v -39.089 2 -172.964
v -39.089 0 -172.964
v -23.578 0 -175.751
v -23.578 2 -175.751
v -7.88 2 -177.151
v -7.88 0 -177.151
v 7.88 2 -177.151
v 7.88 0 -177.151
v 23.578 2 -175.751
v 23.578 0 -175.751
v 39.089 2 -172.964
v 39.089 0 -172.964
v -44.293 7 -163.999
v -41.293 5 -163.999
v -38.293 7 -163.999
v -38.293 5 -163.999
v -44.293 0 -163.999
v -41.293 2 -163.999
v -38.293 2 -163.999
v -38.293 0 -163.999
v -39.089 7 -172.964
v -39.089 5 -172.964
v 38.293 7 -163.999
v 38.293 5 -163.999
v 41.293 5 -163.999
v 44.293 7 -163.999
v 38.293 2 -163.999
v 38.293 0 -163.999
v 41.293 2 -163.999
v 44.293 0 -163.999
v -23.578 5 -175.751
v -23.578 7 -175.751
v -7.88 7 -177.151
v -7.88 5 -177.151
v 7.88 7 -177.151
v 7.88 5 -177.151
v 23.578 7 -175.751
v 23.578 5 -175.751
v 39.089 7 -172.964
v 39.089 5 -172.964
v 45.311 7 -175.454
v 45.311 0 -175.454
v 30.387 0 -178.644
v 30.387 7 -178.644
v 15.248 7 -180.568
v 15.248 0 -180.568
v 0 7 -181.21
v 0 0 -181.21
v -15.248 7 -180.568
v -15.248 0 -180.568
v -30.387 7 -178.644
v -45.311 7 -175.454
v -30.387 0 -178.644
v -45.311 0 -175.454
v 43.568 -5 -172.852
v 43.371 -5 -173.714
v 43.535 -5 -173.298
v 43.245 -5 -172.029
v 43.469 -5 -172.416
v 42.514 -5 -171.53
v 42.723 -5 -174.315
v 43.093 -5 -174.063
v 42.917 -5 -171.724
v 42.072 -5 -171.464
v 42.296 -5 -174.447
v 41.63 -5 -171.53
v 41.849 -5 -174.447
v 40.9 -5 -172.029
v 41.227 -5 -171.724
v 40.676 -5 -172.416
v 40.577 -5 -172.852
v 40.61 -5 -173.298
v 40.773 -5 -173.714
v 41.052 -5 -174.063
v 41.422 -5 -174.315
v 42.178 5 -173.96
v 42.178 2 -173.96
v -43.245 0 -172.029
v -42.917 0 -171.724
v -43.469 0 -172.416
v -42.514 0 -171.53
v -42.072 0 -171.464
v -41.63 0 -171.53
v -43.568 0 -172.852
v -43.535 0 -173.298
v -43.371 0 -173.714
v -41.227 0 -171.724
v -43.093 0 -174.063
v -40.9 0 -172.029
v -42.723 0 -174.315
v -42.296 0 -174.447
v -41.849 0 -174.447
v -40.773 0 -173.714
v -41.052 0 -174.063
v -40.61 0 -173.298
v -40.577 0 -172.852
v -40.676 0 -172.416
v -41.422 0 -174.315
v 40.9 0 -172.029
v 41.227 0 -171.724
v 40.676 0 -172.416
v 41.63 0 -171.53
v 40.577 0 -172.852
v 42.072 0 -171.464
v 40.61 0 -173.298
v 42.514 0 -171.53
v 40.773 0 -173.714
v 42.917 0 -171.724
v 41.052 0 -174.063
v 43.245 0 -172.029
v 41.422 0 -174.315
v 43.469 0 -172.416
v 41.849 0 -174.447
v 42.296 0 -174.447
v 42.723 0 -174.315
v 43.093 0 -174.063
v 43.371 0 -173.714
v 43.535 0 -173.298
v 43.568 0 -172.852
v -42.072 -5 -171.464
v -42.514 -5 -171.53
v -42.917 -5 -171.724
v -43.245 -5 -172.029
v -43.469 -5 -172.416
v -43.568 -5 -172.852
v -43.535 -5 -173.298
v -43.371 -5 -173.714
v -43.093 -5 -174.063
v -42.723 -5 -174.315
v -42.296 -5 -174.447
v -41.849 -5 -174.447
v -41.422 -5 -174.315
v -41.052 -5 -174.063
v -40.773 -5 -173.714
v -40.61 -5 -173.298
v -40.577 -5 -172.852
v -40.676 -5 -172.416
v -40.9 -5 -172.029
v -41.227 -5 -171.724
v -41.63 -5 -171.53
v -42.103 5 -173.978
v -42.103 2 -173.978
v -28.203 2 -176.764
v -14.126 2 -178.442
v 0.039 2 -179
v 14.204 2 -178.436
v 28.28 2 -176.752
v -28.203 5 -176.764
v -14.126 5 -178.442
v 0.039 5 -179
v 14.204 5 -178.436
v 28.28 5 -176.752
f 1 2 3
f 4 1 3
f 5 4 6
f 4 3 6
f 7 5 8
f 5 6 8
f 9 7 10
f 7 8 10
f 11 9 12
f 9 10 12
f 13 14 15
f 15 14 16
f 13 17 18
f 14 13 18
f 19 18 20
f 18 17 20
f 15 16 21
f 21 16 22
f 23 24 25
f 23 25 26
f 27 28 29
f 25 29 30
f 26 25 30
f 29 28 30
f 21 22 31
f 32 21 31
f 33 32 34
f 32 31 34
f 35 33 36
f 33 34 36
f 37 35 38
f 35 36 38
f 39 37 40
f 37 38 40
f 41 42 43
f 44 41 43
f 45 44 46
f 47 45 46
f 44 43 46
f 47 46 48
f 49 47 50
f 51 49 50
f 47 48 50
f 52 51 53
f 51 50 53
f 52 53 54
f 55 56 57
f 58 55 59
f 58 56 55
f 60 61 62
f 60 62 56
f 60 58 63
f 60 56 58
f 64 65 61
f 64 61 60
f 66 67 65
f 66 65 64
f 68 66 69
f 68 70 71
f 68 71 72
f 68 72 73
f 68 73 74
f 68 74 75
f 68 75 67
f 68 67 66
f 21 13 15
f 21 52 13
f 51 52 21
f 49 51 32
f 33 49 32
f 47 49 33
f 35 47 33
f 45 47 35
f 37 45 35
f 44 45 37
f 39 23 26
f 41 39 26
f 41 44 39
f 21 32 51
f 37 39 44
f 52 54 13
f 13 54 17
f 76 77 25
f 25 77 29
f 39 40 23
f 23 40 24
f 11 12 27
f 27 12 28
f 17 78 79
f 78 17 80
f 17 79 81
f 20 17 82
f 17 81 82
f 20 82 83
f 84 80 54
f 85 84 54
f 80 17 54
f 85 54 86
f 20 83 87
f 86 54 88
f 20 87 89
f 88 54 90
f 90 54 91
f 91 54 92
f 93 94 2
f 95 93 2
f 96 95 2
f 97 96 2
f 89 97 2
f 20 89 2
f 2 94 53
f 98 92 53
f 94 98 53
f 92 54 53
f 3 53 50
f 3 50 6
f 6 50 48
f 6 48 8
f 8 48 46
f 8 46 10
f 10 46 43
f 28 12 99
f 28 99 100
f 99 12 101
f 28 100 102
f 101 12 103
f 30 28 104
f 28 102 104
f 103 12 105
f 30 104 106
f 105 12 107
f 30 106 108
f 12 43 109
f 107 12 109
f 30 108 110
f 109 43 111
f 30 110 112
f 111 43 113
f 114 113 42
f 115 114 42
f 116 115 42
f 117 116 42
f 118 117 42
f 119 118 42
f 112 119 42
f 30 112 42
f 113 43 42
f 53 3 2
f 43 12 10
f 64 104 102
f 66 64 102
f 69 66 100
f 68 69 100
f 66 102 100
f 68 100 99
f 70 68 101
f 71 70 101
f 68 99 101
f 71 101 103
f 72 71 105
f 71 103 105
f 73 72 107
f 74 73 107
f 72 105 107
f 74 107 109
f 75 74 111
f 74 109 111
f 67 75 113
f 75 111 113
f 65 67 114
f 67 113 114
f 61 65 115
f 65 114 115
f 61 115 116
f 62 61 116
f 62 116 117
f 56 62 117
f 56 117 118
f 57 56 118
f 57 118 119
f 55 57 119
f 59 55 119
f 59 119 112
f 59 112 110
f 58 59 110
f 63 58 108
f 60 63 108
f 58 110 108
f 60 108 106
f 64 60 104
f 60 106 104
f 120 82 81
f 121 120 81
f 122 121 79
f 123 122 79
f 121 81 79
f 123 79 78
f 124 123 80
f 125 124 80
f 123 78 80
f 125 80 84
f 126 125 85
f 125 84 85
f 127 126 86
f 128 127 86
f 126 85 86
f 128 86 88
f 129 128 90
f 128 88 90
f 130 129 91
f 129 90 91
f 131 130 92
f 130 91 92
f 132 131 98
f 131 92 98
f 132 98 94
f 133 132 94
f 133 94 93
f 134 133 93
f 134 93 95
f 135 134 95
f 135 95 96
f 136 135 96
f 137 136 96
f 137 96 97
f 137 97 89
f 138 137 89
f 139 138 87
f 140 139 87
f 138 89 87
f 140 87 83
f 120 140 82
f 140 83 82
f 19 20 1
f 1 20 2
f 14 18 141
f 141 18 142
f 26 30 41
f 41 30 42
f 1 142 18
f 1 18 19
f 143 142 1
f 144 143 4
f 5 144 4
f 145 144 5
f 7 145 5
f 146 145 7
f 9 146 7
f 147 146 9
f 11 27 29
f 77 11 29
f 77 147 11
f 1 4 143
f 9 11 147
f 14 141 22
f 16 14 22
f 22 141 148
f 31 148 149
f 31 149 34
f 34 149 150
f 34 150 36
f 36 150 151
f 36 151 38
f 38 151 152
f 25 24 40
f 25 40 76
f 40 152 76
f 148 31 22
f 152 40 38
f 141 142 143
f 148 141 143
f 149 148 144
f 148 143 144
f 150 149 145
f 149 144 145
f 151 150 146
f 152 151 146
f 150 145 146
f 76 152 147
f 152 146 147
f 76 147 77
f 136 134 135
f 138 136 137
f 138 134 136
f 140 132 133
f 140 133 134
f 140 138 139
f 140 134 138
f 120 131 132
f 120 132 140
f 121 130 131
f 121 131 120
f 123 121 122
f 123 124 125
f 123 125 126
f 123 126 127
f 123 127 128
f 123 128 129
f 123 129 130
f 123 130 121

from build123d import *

# Parameters (mm, degrees)
BOSS_EXTRUDE4_DEPTH = 2
BOSS_EXTRUDE5_DEPTH = 3
BOSS_EXTRUDE6_DEPTH = 2
SKETCH7_R           = 1.5
BOSS_EXTRUDE7_DEPTH = 5


with BuildPart() as part:
    # Sketch2 → Boss-Extrude4 (new body)
    with BuildSketch(Plane(origin=(0, 0, 0), x_dir=(1, 0, 0), z_dir=(0, 1, 0))):
        with BuildLine():
            Line((-44.292533925, 163.999092012), (-38.292533925, 163.999092012))
            Line((-38.292533925, 163.999092012), (-39.089453392, 172.963740324))
            ThreePointArc((-39.089453392, 172.963740324), (0, 177.325804195), (39.089453392, 172.963740324))
            Line((39.089453392, 172.963740324), (38.292533925, 163.999092012))
            Line((38.292533925, 163.999092012), (44.292533925, 163.999092012))
            Line((44.292533925, 163.999092012), (45.310819911, 175.453920411))
            ThreePointArc((45.310819911, 175.453920411), (0, 181.210233123), (-45.310819911, 175.453920411))
            Line((-45.310819911, 175.453920411), (-44.292533925, 163.999092012))
        make_face()
    extrude(amount=BOSS_EXTRUDE4_DEPTH)

    # Sketch5 → Boss-Extrude5 (add)
    with BuildSketch(Plane(origin=(0, 2, 0), x_dir=(1, 0, 0), z_dir=(0, 1, 0))):
        with BuildLine():
            Line((-41.292533925, 163.999092012), (-42.102735456, 173.978043635))
            ThreePointArc((-42.102735456, 173.978043635), (0.038720573, 178.999995812), (42.178, 173.959812359))
            Line((42.178, 173.959812359), (41.292533925, 163.999092012))
            Line((41.292533925, 163.999092012), (44.292533925, 163.999092012))
            Line((44.292533925, 163.999092012), (45.310819911, 175.453920411))
            ThreePointArc((45.310819911, 175.453920411), (0, 181.210233123), (-45.310819911, 175.453920411))
            Line((-45.310819911, 175.453920411), (-44.292533925, 163.999092012))
            Line((-44.292533925, 163.999092012), (-41.292533925, 163.999092012))
        make_face()
    extrude(amount=BOSS_EXTRUDE5_DEPTH)

    # Sketch6 → Boss-Extrude6 (add)
    with BuildSketch(Plane(origin=(0, 5, 0), x_dir=(1, 0, 0), z_dir=(0, 1, 0))):
        with BuildLine():
            Line((-44.292533925, 163.999092012), (-38.292533925, 163.999092012))
            Line((-38.292533925, 163.999092012), (-39.089453392, 172.963740324))
            ThreePointArc((-39.089453392, 172.963740324), (0, 177.325804195), (39.089453392, 172.963740324))
            Line((39.089453392, 172.963740324), (38.292533925, 163.999092012))
            Line((38.292533925, 163.999092012), (44.292533925, 163.999092012))
            Line((44.292533925, 163.999092012), (45.310819911, 175.453920411))
            ThreePointArc((45.310819911, 175.453920411), (0, 181.210233123), (-45.310819911, 175.453920411))
            Line((-45.310819911, 175.453920411), (-44.292533925, 163.999092012))
        make_face()
    extrude(amount=BOSS_EXTRUDE6_DEPTH)

    # Sketch7 → Boss-Extrude7 (add)
    with BuildSketch(Plane.XZ):
        with Locations(Location((-42.072341363, -172.963740324, 0), (0, 0, 90))):
            Circle(SKETCH7_R)
        with Locations(Location((42.072341363, -172.963740324, 0), (0, 0, 90))):
            Circle(SKETCH7_R)
    extrude(amount=BOSS_EXTRUDE7_DEPTH)


solid = part.part
